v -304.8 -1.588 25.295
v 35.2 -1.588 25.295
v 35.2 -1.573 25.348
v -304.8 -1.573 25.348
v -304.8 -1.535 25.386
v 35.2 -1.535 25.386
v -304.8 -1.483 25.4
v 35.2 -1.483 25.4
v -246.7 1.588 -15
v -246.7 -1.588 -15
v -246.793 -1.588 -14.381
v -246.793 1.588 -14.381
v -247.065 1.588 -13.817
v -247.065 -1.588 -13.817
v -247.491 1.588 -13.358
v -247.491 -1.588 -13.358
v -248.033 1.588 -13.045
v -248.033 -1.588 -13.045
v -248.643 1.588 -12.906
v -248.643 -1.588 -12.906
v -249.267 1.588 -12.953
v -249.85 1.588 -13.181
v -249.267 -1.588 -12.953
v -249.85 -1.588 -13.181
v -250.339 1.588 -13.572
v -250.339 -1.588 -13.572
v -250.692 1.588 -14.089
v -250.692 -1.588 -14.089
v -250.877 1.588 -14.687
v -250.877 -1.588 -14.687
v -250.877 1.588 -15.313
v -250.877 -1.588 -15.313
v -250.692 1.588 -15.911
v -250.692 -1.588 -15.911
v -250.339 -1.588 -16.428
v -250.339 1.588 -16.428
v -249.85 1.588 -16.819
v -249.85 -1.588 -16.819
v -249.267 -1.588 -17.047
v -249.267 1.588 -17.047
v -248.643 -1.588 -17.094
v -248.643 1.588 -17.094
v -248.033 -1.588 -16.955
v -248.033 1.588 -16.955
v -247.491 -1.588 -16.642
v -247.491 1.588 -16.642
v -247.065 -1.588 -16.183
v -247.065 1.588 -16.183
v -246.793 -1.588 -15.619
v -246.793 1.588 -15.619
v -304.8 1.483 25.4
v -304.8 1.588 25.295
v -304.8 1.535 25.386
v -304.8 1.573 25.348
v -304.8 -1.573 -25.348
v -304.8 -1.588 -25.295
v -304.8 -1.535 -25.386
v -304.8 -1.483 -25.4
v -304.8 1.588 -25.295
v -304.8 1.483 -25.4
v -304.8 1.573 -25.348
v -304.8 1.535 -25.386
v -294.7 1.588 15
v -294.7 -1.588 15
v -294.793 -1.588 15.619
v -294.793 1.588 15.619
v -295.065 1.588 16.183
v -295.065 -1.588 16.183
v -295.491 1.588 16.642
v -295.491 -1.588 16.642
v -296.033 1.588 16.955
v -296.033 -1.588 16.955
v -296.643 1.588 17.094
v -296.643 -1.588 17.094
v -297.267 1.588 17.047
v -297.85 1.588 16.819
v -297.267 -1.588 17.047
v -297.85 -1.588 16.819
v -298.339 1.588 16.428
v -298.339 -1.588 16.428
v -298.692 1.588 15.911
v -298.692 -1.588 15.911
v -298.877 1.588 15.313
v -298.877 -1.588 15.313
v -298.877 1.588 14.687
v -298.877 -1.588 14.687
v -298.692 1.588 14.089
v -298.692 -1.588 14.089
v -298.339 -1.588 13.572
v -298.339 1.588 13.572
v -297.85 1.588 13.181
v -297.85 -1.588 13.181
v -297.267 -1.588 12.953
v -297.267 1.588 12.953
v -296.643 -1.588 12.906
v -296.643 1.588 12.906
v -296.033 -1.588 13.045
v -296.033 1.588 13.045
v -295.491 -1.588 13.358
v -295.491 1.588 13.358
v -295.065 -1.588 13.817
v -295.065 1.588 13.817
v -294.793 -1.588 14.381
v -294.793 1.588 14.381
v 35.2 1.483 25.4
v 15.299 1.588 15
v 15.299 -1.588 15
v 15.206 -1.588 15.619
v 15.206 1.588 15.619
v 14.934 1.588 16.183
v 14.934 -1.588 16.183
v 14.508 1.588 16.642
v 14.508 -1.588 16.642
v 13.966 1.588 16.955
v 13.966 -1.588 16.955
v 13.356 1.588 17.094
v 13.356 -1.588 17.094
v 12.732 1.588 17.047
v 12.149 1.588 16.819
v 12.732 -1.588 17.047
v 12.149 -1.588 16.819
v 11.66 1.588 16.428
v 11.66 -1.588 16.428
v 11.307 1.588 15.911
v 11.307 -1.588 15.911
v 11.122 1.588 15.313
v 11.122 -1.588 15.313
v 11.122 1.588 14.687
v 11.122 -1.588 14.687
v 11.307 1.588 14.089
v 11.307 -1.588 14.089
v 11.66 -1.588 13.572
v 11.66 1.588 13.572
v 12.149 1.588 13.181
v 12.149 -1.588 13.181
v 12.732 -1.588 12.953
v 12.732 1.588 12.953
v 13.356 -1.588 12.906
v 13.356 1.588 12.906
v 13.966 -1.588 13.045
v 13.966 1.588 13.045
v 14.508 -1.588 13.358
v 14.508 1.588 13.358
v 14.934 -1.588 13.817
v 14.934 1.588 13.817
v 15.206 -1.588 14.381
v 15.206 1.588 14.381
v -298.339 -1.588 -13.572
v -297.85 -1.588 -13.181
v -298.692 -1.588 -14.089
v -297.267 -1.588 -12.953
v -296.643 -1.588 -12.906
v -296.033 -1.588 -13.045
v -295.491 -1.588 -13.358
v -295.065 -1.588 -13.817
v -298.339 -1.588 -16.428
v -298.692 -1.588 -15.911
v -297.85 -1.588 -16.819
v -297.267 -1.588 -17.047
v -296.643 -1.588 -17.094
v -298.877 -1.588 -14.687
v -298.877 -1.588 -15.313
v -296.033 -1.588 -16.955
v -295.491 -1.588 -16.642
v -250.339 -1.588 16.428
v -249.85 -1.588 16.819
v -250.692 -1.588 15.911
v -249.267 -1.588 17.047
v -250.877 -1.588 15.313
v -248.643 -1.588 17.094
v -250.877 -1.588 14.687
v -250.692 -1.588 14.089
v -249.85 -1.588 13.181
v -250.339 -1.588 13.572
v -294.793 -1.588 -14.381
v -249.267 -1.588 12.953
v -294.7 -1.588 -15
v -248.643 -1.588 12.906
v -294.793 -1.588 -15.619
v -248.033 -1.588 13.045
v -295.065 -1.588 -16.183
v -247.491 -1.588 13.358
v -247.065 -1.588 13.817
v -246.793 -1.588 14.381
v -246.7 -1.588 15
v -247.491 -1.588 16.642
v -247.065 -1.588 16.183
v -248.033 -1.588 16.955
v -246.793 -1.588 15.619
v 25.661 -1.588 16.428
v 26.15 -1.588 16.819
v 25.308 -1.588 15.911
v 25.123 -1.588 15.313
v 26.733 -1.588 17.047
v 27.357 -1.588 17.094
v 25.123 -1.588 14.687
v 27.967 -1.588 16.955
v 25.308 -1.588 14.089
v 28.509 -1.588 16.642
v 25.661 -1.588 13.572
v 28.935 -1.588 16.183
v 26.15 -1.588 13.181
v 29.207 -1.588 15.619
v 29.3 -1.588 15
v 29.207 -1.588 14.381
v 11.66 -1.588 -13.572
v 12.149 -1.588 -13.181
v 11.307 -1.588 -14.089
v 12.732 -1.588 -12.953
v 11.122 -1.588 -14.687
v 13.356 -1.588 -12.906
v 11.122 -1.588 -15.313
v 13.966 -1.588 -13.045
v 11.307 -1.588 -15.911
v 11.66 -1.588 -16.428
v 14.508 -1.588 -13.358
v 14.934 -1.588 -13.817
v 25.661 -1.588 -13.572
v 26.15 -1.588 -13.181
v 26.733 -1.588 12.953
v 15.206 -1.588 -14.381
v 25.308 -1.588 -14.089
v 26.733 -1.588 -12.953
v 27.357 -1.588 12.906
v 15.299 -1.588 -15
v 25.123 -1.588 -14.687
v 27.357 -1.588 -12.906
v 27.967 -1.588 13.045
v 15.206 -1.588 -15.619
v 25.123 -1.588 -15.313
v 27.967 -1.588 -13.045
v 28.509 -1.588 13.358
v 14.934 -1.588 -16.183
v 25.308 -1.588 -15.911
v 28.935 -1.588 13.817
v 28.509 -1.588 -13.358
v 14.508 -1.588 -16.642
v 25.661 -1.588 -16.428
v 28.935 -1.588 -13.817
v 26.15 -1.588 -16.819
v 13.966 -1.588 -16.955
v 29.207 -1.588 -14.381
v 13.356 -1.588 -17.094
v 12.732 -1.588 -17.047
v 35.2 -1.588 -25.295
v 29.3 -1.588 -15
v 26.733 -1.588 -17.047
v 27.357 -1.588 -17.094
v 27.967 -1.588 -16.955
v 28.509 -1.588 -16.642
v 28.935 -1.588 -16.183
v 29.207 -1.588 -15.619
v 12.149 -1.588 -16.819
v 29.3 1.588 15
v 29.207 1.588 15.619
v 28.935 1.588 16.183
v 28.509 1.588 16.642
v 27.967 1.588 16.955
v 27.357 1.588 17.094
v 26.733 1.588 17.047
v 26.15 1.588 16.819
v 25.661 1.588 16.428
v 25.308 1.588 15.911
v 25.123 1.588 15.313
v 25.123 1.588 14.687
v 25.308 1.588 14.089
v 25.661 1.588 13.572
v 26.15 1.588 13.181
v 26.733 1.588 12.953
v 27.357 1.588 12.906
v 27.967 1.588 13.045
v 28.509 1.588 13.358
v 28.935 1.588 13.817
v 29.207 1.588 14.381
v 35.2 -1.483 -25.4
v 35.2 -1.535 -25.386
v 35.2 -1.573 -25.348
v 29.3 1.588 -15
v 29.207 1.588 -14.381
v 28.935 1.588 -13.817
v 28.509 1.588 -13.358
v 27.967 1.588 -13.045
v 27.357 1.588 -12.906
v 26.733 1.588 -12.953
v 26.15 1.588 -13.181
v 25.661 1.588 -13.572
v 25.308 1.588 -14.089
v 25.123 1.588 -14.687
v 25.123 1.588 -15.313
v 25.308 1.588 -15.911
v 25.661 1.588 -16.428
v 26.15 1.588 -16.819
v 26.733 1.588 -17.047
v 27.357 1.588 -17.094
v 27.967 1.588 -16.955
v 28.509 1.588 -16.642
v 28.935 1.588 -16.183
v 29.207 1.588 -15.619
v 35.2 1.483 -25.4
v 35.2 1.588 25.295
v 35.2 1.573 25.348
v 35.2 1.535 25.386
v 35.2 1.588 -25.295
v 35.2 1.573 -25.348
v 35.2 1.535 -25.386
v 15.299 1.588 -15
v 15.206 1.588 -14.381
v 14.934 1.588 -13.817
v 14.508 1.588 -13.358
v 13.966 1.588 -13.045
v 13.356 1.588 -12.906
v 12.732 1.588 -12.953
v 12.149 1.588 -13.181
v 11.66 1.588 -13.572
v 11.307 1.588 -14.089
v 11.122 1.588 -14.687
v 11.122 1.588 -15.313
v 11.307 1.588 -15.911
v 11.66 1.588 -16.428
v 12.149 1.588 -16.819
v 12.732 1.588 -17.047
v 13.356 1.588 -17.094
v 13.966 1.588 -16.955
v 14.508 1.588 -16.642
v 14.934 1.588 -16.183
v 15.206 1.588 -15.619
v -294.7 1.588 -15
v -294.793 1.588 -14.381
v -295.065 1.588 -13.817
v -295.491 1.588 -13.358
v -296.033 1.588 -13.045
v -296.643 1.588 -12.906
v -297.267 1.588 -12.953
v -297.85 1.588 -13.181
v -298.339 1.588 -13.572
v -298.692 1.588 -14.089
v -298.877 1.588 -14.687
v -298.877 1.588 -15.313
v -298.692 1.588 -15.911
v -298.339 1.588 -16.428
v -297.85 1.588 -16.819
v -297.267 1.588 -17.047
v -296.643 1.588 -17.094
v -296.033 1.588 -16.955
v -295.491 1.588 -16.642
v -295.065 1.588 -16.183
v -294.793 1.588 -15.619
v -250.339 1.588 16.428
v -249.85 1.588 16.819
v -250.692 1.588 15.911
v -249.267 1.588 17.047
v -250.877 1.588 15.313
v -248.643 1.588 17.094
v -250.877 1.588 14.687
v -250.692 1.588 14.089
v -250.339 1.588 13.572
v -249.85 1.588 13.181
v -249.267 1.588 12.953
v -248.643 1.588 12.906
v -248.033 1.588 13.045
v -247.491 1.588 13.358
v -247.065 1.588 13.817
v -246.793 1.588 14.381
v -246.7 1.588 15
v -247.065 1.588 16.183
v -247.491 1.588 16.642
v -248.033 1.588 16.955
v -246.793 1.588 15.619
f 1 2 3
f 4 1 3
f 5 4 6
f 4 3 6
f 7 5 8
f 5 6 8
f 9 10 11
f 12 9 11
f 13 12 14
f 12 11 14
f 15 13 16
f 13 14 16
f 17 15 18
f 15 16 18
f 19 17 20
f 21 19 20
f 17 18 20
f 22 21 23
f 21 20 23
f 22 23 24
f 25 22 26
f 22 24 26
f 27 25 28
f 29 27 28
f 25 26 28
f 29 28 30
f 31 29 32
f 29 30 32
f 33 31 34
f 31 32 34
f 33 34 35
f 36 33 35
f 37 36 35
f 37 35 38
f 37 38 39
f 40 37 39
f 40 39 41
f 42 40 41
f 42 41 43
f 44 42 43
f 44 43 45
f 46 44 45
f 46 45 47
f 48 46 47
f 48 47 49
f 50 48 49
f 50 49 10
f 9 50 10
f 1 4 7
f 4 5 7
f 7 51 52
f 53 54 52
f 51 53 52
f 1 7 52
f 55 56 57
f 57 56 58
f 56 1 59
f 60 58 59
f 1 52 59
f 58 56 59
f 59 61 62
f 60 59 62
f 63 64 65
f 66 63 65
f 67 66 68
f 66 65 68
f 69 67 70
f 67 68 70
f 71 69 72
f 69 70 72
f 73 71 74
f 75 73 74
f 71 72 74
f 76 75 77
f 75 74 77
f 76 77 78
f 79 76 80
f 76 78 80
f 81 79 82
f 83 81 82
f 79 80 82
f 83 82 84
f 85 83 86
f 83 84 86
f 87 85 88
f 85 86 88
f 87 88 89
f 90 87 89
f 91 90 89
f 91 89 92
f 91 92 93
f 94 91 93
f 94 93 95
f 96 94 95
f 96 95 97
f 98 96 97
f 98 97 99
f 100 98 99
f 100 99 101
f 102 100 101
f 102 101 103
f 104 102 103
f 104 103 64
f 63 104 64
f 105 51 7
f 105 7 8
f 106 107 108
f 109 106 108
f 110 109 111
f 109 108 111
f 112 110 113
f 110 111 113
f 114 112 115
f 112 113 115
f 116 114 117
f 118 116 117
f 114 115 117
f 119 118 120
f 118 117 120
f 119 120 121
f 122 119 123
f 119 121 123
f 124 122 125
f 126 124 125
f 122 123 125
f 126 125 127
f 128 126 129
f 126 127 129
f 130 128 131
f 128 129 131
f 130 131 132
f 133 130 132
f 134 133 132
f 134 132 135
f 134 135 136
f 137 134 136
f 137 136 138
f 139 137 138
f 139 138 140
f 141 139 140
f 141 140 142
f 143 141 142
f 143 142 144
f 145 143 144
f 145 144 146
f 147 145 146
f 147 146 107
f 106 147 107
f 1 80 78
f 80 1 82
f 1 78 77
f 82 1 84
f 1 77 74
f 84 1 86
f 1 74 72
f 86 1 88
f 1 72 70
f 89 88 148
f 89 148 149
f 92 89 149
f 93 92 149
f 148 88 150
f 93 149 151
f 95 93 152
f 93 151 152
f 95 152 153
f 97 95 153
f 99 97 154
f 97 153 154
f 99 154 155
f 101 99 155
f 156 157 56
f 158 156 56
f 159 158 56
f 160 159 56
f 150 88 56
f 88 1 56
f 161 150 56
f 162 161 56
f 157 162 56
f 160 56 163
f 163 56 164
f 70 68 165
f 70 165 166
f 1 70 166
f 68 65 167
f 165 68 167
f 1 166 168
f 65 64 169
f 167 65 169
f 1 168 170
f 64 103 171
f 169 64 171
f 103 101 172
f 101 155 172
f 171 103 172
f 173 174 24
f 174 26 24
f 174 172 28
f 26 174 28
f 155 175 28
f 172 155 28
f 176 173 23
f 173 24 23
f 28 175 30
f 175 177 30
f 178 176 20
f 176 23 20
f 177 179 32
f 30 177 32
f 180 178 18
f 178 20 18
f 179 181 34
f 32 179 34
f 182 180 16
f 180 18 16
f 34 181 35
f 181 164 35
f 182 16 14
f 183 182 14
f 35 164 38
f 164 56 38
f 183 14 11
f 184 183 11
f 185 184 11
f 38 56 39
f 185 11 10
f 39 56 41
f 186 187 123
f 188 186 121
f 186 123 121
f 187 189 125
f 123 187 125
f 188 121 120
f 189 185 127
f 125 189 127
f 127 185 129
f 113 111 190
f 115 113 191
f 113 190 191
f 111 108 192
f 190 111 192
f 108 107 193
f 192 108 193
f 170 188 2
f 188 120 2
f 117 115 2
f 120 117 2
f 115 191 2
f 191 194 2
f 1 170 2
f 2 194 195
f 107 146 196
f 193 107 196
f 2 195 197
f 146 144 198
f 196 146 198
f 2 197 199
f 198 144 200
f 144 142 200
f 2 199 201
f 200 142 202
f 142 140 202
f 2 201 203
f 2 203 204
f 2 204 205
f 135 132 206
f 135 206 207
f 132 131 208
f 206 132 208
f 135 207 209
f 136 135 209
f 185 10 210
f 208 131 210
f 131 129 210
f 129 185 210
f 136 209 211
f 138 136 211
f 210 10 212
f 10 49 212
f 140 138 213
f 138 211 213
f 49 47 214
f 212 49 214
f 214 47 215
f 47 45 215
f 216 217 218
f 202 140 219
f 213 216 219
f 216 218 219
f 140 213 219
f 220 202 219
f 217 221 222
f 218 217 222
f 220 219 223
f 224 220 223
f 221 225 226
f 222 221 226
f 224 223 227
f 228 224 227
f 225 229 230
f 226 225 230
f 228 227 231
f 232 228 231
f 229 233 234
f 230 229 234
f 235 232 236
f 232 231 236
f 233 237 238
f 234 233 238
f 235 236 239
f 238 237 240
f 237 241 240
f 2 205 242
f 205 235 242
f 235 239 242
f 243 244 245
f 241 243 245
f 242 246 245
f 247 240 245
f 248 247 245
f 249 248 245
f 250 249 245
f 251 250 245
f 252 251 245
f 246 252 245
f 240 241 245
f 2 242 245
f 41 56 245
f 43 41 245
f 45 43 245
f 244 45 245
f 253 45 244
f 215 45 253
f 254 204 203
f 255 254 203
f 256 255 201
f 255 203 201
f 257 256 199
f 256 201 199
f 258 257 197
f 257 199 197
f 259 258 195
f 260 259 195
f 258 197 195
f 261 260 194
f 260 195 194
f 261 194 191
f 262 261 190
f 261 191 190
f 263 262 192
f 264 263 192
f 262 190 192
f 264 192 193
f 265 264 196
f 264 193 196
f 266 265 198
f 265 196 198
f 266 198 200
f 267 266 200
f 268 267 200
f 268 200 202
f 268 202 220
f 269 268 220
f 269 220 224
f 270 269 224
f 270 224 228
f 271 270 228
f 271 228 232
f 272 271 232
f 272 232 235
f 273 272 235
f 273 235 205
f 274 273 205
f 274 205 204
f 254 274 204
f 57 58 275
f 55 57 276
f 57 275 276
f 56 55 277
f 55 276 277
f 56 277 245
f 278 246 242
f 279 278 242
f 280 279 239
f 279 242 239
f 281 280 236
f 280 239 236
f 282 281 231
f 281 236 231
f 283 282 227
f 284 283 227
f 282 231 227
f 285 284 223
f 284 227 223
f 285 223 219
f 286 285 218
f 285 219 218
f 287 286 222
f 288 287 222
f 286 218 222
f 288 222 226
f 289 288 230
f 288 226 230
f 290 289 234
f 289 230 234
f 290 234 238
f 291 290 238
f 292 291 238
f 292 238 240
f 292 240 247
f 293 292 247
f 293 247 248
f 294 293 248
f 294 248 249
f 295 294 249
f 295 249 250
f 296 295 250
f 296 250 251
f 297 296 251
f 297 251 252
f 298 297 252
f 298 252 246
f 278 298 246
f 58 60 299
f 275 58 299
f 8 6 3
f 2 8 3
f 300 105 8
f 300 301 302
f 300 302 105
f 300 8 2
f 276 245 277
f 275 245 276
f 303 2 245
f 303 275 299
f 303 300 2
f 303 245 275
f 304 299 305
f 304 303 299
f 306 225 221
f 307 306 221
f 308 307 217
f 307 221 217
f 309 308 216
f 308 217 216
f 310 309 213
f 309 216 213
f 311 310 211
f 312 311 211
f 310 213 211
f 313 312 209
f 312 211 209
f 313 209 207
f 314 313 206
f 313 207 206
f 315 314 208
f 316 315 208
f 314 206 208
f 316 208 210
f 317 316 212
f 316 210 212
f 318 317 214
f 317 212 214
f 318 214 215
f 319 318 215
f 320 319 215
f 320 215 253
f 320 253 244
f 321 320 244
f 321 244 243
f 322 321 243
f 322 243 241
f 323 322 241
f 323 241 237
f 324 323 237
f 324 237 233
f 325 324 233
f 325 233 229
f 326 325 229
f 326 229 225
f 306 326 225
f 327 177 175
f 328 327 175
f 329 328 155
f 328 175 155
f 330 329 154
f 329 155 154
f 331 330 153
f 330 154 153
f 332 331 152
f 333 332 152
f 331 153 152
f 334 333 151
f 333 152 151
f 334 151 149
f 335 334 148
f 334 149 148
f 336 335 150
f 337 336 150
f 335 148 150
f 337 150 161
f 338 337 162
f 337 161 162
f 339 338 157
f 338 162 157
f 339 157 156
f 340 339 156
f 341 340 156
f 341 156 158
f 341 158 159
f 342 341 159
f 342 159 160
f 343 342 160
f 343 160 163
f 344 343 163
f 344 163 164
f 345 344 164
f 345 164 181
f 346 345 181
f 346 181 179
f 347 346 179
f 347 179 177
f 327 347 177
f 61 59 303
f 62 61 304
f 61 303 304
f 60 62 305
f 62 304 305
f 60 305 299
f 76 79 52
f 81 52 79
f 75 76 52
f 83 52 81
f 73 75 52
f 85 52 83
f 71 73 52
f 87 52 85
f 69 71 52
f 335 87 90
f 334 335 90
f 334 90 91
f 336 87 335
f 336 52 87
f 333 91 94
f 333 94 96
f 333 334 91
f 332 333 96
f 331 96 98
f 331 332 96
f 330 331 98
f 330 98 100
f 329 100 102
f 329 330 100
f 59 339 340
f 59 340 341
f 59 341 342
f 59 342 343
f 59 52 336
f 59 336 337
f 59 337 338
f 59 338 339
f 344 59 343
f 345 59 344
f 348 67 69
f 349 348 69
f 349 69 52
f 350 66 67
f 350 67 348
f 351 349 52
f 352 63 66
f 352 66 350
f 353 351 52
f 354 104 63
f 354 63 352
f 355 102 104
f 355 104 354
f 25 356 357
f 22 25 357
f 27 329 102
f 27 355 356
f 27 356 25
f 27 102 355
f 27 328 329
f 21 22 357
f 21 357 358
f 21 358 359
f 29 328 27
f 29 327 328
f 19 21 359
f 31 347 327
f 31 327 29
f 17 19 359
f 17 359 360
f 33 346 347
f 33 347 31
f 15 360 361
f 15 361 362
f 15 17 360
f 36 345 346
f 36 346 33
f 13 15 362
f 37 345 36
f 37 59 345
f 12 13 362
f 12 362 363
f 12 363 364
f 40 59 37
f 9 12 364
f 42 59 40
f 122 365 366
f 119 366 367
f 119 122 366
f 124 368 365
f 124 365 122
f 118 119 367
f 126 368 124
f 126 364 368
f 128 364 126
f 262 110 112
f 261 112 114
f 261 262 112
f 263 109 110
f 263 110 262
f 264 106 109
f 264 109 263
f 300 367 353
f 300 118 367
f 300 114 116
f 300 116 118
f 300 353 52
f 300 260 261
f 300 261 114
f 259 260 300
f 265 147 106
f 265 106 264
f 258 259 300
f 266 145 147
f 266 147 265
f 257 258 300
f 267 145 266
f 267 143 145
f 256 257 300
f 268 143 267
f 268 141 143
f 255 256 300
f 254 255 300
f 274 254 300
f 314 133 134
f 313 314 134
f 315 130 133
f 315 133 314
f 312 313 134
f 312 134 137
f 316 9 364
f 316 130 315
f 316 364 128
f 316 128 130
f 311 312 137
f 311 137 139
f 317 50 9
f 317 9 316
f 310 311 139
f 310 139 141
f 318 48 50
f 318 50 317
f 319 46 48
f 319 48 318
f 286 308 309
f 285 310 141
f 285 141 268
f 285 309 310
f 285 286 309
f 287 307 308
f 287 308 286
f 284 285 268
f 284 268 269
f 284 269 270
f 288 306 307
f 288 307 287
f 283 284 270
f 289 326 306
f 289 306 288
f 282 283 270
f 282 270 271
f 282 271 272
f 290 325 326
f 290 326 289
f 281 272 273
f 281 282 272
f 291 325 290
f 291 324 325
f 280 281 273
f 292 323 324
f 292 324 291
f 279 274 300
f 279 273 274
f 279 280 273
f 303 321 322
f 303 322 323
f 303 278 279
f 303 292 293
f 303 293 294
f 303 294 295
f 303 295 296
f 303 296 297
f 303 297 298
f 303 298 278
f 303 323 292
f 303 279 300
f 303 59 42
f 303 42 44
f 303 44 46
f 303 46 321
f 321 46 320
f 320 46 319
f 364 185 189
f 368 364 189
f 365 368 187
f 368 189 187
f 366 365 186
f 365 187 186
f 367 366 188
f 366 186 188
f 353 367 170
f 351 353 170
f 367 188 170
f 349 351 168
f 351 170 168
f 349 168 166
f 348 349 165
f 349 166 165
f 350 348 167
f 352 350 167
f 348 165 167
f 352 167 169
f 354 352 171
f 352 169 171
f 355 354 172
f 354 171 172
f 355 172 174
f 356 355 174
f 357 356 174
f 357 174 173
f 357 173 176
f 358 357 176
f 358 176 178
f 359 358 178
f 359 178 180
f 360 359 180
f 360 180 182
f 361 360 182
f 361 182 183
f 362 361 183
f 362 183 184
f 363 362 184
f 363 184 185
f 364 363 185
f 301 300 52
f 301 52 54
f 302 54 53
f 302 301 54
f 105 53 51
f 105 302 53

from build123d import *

# Parameters (mm, degrees)
SKETCH3_W                = 609.6
SKETCH3_H                = 50.8
BOSS_EXTRUDE1_DEPTH      = 1.5875
BOSS_EXTRUDE1_DEPTH_BACK = 1.5875
FILLET1_R                = 0.104775
CUT_EXTRUDE1_START       = -269.6
SKETCH4_W                = 50.8
SKETCH4_H                = 3.175
CUT_EXTRUDE1_DEPTH       = 269.6
SKETCH5_R                = 2.1
CUT_EXTRUDE2_DEPTH       = 4.175


with BuildPart() as part:
    # Sketch3 → Boss-Extrude1 (new body, two sides)
    with BuildSketch(Plane(origin=(0, 0, 0), x_dir=(1, 0, 0), z_dir=(0, 1, 0))) as boss_extrude1_sk:
        Rectangle(SKETCH3_W, SKETCH3_H)
    extrude(amount=BOSS_EXTRUDE1_DEPTH)
    extrude(boss_extrude1_sk.sketch, amount=-BOSS_EXTRUDE1_DEPTH_BACK)

    # Fillet1
    fillet1_edges = [part.edges().sort_by_distance(p)[0] for p in [
        (0, 1.5875, 25.4),
        (0, -1.5875, -25.4),
        (0, 1.5875, -25.4),
        (0, -1.5875, 25.4),
    ]]
    fillet(fillet1_edges, radius=FILLET1_R)

    # Sketch4 → Cut-Extrude1 (cut)
    with BuildSketch(Plane(origin=(304.8, 0, 0), x_dir=(0, 0, -1), z_dir=(1, 0, 0)).offset(CUT_EXTRUDE1_START)):
        Rectangle(SKETCH4_W, SKETCH4_H)
    extrude(amount=CUT_EXTRUDE1_DEPTH, mode=Mode.SUBTRACT)

    # Sketch5 → Cut-Extrude2 (cut, through all)
    with BuildSketch(Plane.XZ.offset(1.5875)):
        with Locations((27.2, -15)):
            Circle(SKETCH5_R)
        with Locations((27.2, 15)):
            Circle(SKETCH5_R)
        with Locations((13.199, 15)):
            Circle(SKETCH5_R)
        with Locations((13.199, -15)):
            Circle(SKETCH5_R)
        with Locations((-248.8, -15)):
            Circle(SKETCH5_R)
        with Locations((-248.8, 15)):
            Circle(SKETCH5_R)
        with Locations((-296.8, 15)):
            Circle(SKETCH5_R)
        with Locations((-296.8, -15)):
            Circle(SKETCH5_R)
    extrude(amount=-CUT_EXTRUDE2_DEPTH, mode=Mode.SUBTRACT)


solid = part.part
